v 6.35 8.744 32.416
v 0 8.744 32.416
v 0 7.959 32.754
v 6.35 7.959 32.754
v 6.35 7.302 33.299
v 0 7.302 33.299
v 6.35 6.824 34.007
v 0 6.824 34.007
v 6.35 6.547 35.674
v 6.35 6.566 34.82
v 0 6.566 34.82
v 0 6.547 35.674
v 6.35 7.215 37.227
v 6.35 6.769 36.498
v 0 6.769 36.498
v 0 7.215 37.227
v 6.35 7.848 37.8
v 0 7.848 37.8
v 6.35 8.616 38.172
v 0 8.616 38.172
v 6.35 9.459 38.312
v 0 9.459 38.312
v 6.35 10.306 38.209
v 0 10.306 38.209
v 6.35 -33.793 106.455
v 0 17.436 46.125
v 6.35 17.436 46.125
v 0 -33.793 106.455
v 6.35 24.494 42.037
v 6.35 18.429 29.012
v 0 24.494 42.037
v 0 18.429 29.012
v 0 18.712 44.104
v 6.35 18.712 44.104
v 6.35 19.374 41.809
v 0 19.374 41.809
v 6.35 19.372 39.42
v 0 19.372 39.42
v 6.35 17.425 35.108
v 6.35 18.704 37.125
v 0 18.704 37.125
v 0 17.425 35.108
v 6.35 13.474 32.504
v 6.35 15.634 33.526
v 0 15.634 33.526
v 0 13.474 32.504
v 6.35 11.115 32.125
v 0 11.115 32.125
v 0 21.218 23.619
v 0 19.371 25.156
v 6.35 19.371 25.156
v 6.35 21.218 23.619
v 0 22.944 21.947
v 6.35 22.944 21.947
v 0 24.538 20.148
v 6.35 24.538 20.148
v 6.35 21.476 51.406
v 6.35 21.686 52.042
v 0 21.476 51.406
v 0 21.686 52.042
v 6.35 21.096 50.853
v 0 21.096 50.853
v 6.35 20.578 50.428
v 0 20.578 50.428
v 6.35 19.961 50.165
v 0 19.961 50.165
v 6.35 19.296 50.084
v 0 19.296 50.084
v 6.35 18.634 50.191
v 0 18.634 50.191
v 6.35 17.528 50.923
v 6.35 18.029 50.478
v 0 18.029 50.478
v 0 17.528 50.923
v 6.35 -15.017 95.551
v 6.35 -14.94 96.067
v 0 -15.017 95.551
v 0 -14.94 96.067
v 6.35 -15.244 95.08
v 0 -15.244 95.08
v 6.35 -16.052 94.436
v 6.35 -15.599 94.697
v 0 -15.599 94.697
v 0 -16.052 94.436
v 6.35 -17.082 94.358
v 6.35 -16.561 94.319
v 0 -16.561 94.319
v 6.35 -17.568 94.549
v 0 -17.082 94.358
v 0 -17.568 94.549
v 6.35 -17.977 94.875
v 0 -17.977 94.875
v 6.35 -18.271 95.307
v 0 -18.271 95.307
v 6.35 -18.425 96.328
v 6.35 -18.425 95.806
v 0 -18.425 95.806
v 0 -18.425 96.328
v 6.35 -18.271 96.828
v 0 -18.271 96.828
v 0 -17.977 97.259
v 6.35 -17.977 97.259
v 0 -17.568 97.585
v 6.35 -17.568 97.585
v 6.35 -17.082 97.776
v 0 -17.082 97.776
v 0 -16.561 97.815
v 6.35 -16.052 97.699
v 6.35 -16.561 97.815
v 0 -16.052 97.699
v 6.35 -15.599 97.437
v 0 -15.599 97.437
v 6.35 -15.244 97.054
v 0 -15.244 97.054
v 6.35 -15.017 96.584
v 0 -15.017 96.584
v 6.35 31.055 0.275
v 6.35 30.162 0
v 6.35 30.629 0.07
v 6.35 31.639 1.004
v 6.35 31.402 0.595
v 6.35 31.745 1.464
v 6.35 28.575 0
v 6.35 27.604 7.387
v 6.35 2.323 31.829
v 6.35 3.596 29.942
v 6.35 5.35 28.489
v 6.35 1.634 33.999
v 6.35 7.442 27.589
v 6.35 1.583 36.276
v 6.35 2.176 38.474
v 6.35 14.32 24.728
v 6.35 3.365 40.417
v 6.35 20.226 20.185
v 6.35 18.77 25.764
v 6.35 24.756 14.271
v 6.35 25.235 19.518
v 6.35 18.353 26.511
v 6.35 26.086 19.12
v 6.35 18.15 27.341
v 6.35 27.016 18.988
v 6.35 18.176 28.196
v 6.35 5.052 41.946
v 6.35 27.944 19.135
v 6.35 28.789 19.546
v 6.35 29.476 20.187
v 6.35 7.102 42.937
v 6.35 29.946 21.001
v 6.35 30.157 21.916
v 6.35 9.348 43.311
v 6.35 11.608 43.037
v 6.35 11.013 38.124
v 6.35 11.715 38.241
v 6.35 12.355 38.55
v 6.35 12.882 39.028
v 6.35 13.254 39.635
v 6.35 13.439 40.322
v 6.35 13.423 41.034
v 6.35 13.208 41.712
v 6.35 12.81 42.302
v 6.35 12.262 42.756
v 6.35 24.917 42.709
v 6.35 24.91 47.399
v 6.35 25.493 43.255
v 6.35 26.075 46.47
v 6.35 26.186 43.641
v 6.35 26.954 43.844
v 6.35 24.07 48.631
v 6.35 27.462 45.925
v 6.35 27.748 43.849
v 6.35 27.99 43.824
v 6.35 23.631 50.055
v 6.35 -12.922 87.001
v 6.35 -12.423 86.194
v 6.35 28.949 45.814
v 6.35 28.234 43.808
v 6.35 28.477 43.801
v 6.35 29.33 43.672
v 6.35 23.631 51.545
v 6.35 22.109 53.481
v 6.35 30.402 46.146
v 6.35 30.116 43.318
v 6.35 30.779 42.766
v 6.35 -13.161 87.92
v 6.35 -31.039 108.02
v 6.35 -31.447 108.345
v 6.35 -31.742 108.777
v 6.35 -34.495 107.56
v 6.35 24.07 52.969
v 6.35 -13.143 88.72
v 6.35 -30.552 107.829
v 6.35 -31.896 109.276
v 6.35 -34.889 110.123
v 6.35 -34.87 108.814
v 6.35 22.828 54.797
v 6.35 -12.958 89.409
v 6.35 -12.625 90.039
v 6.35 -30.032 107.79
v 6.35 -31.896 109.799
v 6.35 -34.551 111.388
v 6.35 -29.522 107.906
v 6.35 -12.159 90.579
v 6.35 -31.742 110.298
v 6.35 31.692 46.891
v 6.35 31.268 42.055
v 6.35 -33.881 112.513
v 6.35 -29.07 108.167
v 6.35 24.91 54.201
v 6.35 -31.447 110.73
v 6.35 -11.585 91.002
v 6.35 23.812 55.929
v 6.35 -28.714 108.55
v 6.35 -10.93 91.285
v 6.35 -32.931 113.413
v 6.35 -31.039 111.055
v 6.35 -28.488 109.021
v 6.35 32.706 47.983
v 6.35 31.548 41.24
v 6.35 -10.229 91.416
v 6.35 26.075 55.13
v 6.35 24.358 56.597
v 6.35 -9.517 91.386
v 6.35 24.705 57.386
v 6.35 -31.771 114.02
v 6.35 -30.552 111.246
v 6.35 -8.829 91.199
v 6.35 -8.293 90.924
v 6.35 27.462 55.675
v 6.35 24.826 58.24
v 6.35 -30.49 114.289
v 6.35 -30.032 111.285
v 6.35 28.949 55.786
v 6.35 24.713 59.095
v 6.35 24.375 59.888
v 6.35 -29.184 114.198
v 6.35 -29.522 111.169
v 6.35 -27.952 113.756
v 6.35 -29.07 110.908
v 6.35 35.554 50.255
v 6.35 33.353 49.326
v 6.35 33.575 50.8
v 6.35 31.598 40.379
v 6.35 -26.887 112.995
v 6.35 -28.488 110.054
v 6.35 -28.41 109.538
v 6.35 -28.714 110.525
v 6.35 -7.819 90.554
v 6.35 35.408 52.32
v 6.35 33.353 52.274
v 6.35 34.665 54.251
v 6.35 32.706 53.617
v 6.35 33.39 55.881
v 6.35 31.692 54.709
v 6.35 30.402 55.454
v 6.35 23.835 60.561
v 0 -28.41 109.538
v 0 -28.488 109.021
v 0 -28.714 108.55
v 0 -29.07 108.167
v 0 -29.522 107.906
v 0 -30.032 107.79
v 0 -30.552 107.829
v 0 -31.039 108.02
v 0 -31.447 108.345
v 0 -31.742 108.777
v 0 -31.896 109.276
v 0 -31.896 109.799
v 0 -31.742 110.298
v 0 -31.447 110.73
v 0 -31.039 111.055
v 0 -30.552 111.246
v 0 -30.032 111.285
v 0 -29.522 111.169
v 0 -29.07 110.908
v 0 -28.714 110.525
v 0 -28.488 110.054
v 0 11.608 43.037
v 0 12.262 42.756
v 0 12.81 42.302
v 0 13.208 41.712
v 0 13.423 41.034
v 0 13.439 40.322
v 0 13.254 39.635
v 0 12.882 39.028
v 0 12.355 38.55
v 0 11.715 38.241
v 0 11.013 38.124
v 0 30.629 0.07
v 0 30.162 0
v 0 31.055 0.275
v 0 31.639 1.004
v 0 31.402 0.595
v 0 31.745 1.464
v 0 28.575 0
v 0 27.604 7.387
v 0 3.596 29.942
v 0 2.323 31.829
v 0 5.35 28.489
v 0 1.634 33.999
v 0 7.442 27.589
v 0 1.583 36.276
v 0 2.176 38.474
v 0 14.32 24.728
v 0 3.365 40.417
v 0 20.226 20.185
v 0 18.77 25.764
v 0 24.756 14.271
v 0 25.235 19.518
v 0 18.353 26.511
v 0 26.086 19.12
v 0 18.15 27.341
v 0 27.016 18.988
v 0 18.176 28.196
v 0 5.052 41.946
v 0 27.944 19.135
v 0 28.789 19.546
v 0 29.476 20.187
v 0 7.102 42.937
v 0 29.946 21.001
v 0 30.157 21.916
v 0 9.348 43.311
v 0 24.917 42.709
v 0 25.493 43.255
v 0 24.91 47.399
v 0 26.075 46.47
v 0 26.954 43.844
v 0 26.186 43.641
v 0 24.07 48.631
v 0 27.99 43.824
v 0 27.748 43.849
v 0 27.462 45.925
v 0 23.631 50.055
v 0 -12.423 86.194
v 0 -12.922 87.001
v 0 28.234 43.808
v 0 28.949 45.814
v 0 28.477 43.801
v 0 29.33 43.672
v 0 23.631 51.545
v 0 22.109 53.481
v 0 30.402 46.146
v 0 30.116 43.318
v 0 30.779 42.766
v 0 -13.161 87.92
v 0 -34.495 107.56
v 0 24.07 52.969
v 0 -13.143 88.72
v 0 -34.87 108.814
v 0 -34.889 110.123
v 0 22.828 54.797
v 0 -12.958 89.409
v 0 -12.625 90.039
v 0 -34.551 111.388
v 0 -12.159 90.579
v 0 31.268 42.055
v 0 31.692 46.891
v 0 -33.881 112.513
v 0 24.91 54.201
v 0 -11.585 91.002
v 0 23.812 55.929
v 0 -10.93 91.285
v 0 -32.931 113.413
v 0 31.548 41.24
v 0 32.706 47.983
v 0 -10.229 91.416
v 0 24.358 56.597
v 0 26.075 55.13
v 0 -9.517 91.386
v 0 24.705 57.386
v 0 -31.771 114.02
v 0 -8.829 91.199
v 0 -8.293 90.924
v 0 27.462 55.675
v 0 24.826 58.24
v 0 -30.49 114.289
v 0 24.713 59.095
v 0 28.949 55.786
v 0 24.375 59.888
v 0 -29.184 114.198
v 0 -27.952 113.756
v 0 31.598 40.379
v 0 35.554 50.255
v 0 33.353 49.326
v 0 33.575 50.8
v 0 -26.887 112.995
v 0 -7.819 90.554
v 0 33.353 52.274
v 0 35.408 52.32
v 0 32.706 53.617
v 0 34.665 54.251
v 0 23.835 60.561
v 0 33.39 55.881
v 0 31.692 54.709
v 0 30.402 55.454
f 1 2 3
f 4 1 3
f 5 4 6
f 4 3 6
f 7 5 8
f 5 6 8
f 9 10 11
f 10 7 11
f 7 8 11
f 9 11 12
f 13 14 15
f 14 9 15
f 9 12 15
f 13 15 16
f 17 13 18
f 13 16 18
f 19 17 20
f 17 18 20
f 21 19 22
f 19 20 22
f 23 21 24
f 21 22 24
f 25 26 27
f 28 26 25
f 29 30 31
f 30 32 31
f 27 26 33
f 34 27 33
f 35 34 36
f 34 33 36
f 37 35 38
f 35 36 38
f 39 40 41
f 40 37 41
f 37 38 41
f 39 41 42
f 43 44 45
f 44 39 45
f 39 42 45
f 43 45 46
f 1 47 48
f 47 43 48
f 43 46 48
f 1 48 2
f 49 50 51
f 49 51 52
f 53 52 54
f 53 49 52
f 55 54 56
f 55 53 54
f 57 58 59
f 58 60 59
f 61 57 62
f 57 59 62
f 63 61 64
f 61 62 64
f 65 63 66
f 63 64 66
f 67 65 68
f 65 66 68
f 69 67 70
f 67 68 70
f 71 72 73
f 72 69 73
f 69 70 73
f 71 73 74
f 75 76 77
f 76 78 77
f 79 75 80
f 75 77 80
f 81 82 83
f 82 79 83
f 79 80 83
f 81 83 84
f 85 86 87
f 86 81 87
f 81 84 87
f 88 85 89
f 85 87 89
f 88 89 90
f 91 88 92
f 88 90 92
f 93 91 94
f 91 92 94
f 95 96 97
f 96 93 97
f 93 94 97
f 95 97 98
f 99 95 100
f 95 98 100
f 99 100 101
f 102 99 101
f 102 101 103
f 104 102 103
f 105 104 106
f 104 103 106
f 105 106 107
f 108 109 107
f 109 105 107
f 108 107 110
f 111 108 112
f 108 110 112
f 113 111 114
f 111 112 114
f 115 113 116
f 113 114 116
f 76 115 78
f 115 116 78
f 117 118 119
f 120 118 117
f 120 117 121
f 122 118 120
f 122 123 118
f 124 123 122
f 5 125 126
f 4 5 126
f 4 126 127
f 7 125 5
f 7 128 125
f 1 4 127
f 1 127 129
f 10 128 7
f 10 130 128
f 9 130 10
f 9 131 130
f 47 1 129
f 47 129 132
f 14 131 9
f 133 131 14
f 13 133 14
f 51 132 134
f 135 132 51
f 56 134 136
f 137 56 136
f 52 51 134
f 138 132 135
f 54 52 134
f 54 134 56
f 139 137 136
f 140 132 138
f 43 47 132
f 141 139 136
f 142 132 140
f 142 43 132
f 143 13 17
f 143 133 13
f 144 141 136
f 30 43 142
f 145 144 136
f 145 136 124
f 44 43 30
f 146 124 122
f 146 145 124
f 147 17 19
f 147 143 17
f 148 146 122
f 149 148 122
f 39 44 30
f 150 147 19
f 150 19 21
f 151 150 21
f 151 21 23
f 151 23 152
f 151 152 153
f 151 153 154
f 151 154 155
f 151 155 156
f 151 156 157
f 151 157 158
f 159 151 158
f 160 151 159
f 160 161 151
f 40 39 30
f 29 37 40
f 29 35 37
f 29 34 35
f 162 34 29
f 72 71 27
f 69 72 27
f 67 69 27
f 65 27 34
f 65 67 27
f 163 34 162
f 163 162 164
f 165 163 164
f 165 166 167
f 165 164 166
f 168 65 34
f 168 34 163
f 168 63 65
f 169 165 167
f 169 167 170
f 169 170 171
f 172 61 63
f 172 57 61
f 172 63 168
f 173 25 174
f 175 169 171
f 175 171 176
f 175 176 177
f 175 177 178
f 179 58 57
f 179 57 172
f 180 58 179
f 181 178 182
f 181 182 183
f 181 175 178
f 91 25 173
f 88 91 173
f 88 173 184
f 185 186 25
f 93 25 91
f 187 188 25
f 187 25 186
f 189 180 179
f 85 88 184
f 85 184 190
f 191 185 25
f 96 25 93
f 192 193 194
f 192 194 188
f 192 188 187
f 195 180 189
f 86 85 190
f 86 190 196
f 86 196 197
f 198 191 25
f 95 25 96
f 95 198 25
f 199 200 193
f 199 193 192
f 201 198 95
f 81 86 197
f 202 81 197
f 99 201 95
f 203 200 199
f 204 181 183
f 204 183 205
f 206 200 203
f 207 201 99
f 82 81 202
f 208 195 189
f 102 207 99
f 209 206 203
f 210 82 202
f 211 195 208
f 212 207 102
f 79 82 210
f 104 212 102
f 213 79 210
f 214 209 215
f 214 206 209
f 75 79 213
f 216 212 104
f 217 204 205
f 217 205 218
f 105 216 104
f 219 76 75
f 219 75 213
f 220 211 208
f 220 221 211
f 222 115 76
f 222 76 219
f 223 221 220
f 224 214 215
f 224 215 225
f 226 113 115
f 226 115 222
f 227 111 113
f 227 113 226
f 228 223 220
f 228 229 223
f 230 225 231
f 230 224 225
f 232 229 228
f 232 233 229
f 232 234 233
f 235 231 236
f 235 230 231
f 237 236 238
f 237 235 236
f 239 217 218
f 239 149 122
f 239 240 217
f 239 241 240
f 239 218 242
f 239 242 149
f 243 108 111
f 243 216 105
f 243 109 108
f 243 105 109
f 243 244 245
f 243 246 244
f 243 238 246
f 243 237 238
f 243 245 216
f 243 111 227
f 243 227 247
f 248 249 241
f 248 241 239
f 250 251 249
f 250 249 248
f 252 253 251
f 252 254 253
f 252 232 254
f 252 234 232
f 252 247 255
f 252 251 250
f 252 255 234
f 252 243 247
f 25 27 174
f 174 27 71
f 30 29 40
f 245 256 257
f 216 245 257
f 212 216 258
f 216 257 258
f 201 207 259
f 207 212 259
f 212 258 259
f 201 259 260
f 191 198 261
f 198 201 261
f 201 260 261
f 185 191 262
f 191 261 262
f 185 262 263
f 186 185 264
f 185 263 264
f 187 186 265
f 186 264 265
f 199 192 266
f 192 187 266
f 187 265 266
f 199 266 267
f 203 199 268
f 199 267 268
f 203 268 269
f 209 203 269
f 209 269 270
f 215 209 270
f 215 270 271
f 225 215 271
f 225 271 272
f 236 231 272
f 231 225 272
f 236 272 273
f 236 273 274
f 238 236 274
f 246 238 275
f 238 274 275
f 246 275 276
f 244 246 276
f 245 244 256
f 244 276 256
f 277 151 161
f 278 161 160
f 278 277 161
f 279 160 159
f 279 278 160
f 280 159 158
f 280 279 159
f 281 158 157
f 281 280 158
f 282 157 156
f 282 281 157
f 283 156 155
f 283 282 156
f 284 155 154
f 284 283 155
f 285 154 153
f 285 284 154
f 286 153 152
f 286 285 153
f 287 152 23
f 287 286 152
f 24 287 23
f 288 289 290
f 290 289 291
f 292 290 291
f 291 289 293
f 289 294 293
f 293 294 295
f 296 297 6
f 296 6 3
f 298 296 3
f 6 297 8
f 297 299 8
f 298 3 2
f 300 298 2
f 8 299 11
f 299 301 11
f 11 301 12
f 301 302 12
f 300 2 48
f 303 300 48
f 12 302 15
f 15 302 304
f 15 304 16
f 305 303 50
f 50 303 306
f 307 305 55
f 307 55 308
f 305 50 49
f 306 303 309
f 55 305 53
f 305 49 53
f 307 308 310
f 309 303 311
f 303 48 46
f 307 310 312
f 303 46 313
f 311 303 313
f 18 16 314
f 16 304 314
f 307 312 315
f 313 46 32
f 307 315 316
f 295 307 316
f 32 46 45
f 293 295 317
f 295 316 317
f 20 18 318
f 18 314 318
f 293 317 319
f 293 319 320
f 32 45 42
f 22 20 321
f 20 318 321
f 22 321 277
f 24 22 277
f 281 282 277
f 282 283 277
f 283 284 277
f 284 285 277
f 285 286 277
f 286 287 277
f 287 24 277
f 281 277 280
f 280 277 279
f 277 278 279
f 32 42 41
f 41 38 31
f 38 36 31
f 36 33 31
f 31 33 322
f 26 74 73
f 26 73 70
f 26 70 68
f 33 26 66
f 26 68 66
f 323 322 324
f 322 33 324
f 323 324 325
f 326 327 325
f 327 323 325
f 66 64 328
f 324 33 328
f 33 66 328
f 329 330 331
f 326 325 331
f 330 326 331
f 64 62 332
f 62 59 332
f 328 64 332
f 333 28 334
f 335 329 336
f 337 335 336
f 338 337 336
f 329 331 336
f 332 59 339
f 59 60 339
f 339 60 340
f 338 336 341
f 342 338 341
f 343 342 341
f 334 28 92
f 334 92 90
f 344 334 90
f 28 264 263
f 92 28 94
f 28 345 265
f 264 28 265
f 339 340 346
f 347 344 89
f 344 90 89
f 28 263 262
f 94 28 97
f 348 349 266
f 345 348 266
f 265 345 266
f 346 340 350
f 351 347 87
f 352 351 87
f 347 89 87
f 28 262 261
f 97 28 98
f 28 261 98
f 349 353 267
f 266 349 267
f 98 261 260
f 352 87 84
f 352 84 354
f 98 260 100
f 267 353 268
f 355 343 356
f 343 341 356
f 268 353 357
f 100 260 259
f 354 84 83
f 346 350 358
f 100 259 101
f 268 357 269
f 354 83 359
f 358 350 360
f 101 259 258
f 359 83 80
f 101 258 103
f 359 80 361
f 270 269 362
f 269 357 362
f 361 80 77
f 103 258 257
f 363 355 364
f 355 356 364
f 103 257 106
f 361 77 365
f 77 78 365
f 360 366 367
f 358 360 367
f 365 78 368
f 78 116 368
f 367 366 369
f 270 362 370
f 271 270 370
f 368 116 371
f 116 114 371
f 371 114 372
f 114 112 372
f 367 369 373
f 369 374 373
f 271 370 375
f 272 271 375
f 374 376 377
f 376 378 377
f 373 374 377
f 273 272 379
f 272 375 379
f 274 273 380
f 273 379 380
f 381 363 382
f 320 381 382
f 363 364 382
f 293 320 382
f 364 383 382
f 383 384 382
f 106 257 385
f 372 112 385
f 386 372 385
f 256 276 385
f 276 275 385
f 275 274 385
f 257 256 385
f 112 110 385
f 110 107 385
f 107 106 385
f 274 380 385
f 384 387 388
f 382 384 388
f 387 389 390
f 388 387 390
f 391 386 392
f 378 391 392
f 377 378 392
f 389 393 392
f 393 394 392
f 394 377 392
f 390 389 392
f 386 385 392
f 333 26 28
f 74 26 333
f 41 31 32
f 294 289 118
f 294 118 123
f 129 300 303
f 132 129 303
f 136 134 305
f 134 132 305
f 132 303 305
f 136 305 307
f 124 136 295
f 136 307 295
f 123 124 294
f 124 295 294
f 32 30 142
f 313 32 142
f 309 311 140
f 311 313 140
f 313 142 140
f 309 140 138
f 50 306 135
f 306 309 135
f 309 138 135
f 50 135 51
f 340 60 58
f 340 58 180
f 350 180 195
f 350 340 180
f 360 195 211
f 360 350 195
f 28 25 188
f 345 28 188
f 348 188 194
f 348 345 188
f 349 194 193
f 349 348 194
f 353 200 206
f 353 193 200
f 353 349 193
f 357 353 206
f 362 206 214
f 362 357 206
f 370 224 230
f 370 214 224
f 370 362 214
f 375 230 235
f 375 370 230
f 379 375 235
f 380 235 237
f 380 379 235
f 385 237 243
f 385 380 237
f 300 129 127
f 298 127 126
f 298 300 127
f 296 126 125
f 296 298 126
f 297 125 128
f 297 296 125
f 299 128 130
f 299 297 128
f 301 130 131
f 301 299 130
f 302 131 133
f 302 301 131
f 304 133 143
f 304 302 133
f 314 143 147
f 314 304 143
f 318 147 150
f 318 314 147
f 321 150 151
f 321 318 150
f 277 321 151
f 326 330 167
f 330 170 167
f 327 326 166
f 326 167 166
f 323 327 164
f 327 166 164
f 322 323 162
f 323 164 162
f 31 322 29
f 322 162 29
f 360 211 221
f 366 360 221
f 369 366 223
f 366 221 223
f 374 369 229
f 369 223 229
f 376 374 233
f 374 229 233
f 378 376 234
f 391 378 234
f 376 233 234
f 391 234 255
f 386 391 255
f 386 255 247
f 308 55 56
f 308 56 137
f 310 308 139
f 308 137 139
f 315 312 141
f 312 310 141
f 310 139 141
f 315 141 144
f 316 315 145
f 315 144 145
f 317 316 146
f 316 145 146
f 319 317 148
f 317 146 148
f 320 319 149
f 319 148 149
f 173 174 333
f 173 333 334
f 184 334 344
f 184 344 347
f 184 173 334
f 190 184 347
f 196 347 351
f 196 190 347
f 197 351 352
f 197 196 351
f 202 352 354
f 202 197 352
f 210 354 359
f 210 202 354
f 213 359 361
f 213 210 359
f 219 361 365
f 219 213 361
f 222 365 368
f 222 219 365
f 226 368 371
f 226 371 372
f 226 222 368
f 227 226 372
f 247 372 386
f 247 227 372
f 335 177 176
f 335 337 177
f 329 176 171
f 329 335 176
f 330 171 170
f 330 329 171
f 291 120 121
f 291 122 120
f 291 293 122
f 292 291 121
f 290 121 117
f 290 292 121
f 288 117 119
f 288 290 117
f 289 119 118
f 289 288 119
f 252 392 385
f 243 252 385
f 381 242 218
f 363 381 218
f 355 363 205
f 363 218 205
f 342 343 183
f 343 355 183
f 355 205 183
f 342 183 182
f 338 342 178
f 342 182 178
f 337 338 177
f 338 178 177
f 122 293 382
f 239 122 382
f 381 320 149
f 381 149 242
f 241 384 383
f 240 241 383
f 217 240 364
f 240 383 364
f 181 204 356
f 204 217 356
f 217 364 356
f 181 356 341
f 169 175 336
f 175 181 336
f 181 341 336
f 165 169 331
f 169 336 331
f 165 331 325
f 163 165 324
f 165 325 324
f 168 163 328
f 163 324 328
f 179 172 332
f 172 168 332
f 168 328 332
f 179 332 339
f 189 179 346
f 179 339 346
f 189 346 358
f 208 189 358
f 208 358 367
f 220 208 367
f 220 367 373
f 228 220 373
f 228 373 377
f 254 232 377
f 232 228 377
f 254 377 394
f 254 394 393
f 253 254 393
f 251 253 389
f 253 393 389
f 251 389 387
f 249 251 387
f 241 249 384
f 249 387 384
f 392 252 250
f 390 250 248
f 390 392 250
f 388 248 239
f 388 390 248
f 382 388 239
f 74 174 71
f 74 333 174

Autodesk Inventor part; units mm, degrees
ref_plane "YZ Plane" through (0, 0, 0) normal (1, 0, 0) x (0, 1, 0)
ref_plane "XZ Plane" through (0, 0, 0) normal (0, 1, 0) x (-1, 0, 0)
ref_plane "XY Plane" through (0, 0, 0) normal (0, 0, 1) x (1, 0, 0)
sketch "Sketch1" plane through (0, 0, 0) normal (1, 0, 0) x (0, 1, 0)
  circle A0 centre (28.575, 50.8) radius 7
  circle A1 centre (0, 0) radius 28.575
  line L0 (0, 0) -> (28.575, 50.8) construction
  line L1 (28.575, 0) -> (-28.575, 0)
  arc A2 (13.9234, 2.1588) -> (28.575, 0) centre (28.575, 50.8) ccw construction
  line L2 (28.575, 0) -> (28.575, 43.8) construction
  circle A3 centre (28.575, 50.8) radius 5
  circle A4 centre (30.1625, 1.5875) radius 1.5875
  line L3 (30.1625, 0) -> (28.575, 0)
  line L4 (31.7452, 1.464) -> (35.5538, 50.2552)
  circle A5 centre (-28.575, 87.3125) radius 3 construction
  line L5 (23.4933, 45.9858) -> (-33.7928, 106.4549) construction
  line L6 (33.3896, 55.8813) -> (-26.8868, 112.9946)
  arc A6 (10.9573, 40.6232) -> (8.0927, 30.0027) centre (9.525, 35.313) ccw construction
  arc A7 (11.6084, 43.0369) -> (7.4416, 27.589) centre (9.525, 35.313) ccw
  arc A8 (10.3063, 38.2094) -> (8.7437, 32.4165) centre (9.525, 35.313) ccw
  arc A9 (10.3063, 38.2094) -> (11.6084, 43.0369) centre (10.9573, 40.6232) ccw
  arc A10 (7.4416, 27.589) -> (8.7437, 32.4165) centre (8.0927, 30.0027) ccw construction
  arc A11 (9.525, 35.313) -> (15.1497, 44.1832) centre (10.9573, 40.6232) ccw construction
  arc A12 (8.7437, 32.4165) -> (17.4365, 46.125) centre (10.9573, 40.6232) ccw
  arc A13 (10.3063, 38.2094) -> (12.863, 42.2414) centre (10.9573, 40.6232) ccw
  arc A14 (10.3063, 38.2094) -> (8.7437, 32.4165) centre (9.525, 35.313) ccw
  arc A15 (17.4365, 46.125) -> (12.863, 42.2414) centre (15.1497, 44.1832) ccw construction
  line L7 (17.4365, 46.125) -> (-33.7928, 106.4549)
  line L8 (9.525, 35.313) -> (-28.575, 87.3125) construction
  arc A16 (-26.8868, 112.9946) -> (-33.7928, 106.4549) centre (-30.1625, 109.5375) ccw
  line L9 (-25.4, 109.5375) -> (-34.925, 109.5375) construction
  circle A17 centre (-30.1625, 109.5375) radius 1.7526
  line L10 (28.575, 50.8) -> (-30.1625, 109.5375) construction
  circle A18 centre (-16.6921, 96.0671) radius 1.7526
  circle A19 centre (-16.6921, 96.0671) radius 5.2756
  line L11 (26.9502, 57.6088) -> (-11.7344, 94.2634)
  line L12 (-16.3371, 90.8034) -> (17.5275, 50.9231)
  arc A20 (17.5275, 50.9231) -> (21.6861, 52.0419) centre (19.3426, 52.4644) ccw
  line L13 (29.3849, 12.0246) -> (31.9322, 44.6576)
  arc A21 (29.3849, 12.0246) -> (2.4085, 31.6585) centre (0, 0) ccw
  arc A22 (31.7234, 1.2983) -> (31.6845, 2.0389) centre (0, 0) ccw
  line L14 (17.3128, 26.6145) -> (25.6201, 44.4543)
  circle A23 centre (20.102, 36.3649) radius 1.5875 construction
  line L15 (10.9573, 40.6232) -> (20.102, 36.3649) construction
  point P0 (-20.3953, 106.8437)
  point P1 (8.7437, 32.4165)
  point P2 (7.4416, 27.589)
  point P3 (12.863, 42.2414)
  dimension "d0" = 14
  dimension "d1" = 57.15
  dimension "d3" = 50.8
  dimension "d4" = 10
  dimension "d5" = 3.175
  dimension "d6" = 6
  dimension "d13" = 2.5
  dimension "d15" = 19.05
  dimension "d21" = 3
  dimension "d25" = 57.15
  dimension "d30" = 9.525
  dimension "d33" = 63.5
  dimension "d34" = 22.225
  dimension "d35" = 64.4637
  dimension "d36" = 3.5052
  dimension "d37" = 45
  dimension "d40" = 19.05
  dimension "d45" = 3.175
  dimension "d46" = 3.175
  dimension "d47" = 4.7625
  dimension "d48" = 3.175
  dimension "d50" = 3.175
  dimension "d51" = 3.175
extrude "Extrusion1" add sketch "Sketch1" along normal blind 6.35 contours A0 | A0 L11 A19 L6 | L4 A4 L3 A1 A7 A21 L13 A0 | A19 L12 A20 A0 L14 A21 A7 A9 A8 A12 L7 A16 L6 | A19 | A4 A22 | A4 A22
fillet "Fillet2" radius 3.175 7 edges at (3.175, 29.3849, 12.0246) (3.175, 17.3128, 26.6145) (3.175, 31.9322, 44.6576) (3.175, 26.9502, 57.6088) (3.175, -11.7344, 94.2634) (3.175, -16.3371, 90.8034) (3.175, 25.6201, 44.4543)
properties part number "Arm" material "Aluminum 6061"
